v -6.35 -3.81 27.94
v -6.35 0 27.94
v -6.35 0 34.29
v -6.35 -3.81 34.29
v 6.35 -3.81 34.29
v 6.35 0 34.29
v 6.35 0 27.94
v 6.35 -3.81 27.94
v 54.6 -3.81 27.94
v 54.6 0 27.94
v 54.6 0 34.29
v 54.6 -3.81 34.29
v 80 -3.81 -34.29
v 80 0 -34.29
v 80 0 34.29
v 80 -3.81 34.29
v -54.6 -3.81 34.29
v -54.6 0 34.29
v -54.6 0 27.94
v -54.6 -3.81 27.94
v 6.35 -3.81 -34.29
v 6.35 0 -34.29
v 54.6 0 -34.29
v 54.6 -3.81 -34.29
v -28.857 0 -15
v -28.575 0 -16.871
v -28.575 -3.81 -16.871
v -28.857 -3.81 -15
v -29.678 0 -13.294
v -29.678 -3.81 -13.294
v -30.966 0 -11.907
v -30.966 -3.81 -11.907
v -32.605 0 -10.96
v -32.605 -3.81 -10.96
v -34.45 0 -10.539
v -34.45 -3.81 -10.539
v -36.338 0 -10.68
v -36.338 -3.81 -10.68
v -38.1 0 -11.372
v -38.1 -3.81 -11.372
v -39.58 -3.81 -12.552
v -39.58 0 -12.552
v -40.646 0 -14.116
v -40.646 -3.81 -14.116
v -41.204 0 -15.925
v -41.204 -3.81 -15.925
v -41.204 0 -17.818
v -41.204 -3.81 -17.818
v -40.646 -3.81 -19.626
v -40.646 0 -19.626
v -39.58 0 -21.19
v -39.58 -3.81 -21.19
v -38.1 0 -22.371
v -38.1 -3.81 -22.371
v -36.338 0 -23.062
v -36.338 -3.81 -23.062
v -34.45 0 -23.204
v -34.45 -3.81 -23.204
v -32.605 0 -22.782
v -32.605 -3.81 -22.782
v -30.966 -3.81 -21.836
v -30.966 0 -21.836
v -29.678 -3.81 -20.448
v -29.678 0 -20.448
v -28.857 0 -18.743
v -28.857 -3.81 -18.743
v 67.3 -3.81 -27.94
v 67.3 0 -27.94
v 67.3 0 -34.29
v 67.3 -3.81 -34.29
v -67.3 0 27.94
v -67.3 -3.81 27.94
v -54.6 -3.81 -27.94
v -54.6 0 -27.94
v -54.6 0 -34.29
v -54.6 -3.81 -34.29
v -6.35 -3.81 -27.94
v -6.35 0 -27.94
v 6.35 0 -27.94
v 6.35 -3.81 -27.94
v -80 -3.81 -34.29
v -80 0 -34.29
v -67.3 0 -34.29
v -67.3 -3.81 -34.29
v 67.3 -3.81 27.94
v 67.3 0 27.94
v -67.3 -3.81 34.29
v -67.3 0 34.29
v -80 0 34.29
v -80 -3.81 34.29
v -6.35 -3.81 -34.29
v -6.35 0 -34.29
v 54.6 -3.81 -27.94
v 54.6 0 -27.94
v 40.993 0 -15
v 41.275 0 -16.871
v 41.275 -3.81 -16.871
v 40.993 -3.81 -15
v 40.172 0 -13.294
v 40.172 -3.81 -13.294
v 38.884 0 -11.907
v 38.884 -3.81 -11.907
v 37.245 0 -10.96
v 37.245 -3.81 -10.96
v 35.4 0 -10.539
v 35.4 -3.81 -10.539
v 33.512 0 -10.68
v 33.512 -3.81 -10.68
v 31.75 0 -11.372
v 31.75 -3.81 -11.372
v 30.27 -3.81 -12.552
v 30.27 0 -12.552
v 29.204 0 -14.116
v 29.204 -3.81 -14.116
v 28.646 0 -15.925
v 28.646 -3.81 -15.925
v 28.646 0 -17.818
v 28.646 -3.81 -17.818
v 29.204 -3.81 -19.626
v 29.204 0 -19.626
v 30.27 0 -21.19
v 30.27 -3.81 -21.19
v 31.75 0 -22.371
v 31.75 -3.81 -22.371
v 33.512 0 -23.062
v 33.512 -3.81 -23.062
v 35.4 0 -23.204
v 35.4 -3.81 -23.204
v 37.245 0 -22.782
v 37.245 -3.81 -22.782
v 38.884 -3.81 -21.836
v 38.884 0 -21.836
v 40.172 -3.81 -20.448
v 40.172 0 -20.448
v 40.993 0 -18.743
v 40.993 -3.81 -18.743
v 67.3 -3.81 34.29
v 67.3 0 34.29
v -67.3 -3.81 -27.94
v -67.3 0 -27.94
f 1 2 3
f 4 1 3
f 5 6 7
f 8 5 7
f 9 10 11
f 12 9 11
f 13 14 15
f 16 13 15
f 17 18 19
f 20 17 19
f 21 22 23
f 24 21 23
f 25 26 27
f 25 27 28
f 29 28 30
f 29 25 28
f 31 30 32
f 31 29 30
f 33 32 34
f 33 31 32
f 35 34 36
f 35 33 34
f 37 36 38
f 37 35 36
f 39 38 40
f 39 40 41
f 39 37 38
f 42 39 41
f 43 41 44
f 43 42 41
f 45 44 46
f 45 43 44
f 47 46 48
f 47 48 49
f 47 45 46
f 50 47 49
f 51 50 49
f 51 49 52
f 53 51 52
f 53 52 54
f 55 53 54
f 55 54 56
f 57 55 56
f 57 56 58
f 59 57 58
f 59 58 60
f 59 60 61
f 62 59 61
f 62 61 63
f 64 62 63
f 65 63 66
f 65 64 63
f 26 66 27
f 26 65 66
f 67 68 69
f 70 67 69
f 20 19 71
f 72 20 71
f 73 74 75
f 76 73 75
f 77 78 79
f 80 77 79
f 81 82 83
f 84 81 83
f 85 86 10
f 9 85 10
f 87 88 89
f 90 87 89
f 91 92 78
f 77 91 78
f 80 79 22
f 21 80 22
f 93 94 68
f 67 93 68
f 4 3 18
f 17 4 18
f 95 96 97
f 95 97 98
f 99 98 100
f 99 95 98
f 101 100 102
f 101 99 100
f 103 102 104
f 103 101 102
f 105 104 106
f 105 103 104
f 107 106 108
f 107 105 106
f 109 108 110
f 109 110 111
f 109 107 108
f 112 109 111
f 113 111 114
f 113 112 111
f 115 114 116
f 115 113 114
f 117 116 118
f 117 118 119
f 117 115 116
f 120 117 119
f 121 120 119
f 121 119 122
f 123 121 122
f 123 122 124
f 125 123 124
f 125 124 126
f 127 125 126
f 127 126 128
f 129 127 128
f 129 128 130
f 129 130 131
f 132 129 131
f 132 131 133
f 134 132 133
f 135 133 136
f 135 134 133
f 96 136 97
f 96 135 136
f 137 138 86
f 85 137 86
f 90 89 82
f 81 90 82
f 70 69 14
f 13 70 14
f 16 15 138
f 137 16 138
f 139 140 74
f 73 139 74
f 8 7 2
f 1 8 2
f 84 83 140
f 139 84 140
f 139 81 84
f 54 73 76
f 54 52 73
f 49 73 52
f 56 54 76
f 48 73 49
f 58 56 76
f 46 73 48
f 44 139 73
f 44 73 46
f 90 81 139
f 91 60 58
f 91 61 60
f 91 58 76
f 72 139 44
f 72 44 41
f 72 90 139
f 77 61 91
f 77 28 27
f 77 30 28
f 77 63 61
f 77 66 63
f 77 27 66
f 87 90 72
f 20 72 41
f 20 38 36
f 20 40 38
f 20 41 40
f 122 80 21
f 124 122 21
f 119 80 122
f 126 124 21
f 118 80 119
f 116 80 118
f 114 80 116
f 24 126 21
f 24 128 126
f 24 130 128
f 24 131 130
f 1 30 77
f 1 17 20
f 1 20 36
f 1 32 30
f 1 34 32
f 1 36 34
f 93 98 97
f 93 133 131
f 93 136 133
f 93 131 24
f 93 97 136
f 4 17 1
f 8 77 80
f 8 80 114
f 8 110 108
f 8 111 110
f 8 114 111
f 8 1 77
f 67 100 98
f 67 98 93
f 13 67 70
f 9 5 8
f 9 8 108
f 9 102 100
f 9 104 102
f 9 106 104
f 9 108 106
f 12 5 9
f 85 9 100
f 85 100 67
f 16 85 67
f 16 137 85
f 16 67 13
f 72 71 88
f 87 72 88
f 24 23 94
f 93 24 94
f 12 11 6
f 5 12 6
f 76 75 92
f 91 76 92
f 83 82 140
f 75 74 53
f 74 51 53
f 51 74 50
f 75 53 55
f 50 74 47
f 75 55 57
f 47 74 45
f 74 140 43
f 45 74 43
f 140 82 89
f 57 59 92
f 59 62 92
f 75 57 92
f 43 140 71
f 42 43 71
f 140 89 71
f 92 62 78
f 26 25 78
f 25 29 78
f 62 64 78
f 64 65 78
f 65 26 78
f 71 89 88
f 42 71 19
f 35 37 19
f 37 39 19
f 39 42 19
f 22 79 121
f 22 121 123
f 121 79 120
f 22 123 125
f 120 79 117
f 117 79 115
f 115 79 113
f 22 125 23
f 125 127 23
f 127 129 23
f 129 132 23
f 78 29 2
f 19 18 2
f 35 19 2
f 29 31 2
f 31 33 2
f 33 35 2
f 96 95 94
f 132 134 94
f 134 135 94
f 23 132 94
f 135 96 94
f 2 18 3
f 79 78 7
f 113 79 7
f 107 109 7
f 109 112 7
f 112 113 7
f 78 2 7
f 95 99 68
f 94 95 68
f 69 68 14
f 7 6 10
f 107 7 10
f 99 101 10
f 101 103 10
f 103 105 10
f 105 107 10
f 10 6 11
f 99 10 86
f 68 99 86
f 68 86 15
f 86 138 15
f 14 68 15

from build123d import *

# Parameters (mm, degrees)
F0_R     = 6.35
F1_DEPTH = 3.81


# Not quite as in the source:
# - a feature names something its author has since deleted; it is built from what else it names


with BuildPart() as f1:
    # F0 (on Front) → F1 (new body)
    with BuildSketch(Plane.XZ):
        Polygon((-80, 34.29), (-80, -34.29), (-67.3, -34.29), (-67.3, -27.94), (-54.6, -27.94), (-54.6, -34.29), (-6.35, -34.29), (-6.35, -27.94), (6.35, -27.94), (6.35, -34.29), (54.6, -34.29), (54.6, -27.94), (67.3, -27.94), (67.3, -34.29), (80, -34.29), (80, 34.29), (67.3, 34.29), (67.3, 27.94), (54.6, 27.94), (54.6, 34.29), (6.35, 34.29), (6.35, 27.94), (-6.35, 27.94), (-6.35, 34.29), (-54.6, 34.29), (-54.6, 27.94), (-67.3, 27.94), (-67.3, 34.29), align=None)
        with Locations((-34.925, -16.8712735176)):
            Circle(F0_R, mode=Mode.SUBTRACT)
        with Locations((34.925, -16.8712735176)):
            Circle(F0_R, mode=Mode.SUBTRACT)
    extrude(amount=F1_DEPTH)


solid = f1.part
